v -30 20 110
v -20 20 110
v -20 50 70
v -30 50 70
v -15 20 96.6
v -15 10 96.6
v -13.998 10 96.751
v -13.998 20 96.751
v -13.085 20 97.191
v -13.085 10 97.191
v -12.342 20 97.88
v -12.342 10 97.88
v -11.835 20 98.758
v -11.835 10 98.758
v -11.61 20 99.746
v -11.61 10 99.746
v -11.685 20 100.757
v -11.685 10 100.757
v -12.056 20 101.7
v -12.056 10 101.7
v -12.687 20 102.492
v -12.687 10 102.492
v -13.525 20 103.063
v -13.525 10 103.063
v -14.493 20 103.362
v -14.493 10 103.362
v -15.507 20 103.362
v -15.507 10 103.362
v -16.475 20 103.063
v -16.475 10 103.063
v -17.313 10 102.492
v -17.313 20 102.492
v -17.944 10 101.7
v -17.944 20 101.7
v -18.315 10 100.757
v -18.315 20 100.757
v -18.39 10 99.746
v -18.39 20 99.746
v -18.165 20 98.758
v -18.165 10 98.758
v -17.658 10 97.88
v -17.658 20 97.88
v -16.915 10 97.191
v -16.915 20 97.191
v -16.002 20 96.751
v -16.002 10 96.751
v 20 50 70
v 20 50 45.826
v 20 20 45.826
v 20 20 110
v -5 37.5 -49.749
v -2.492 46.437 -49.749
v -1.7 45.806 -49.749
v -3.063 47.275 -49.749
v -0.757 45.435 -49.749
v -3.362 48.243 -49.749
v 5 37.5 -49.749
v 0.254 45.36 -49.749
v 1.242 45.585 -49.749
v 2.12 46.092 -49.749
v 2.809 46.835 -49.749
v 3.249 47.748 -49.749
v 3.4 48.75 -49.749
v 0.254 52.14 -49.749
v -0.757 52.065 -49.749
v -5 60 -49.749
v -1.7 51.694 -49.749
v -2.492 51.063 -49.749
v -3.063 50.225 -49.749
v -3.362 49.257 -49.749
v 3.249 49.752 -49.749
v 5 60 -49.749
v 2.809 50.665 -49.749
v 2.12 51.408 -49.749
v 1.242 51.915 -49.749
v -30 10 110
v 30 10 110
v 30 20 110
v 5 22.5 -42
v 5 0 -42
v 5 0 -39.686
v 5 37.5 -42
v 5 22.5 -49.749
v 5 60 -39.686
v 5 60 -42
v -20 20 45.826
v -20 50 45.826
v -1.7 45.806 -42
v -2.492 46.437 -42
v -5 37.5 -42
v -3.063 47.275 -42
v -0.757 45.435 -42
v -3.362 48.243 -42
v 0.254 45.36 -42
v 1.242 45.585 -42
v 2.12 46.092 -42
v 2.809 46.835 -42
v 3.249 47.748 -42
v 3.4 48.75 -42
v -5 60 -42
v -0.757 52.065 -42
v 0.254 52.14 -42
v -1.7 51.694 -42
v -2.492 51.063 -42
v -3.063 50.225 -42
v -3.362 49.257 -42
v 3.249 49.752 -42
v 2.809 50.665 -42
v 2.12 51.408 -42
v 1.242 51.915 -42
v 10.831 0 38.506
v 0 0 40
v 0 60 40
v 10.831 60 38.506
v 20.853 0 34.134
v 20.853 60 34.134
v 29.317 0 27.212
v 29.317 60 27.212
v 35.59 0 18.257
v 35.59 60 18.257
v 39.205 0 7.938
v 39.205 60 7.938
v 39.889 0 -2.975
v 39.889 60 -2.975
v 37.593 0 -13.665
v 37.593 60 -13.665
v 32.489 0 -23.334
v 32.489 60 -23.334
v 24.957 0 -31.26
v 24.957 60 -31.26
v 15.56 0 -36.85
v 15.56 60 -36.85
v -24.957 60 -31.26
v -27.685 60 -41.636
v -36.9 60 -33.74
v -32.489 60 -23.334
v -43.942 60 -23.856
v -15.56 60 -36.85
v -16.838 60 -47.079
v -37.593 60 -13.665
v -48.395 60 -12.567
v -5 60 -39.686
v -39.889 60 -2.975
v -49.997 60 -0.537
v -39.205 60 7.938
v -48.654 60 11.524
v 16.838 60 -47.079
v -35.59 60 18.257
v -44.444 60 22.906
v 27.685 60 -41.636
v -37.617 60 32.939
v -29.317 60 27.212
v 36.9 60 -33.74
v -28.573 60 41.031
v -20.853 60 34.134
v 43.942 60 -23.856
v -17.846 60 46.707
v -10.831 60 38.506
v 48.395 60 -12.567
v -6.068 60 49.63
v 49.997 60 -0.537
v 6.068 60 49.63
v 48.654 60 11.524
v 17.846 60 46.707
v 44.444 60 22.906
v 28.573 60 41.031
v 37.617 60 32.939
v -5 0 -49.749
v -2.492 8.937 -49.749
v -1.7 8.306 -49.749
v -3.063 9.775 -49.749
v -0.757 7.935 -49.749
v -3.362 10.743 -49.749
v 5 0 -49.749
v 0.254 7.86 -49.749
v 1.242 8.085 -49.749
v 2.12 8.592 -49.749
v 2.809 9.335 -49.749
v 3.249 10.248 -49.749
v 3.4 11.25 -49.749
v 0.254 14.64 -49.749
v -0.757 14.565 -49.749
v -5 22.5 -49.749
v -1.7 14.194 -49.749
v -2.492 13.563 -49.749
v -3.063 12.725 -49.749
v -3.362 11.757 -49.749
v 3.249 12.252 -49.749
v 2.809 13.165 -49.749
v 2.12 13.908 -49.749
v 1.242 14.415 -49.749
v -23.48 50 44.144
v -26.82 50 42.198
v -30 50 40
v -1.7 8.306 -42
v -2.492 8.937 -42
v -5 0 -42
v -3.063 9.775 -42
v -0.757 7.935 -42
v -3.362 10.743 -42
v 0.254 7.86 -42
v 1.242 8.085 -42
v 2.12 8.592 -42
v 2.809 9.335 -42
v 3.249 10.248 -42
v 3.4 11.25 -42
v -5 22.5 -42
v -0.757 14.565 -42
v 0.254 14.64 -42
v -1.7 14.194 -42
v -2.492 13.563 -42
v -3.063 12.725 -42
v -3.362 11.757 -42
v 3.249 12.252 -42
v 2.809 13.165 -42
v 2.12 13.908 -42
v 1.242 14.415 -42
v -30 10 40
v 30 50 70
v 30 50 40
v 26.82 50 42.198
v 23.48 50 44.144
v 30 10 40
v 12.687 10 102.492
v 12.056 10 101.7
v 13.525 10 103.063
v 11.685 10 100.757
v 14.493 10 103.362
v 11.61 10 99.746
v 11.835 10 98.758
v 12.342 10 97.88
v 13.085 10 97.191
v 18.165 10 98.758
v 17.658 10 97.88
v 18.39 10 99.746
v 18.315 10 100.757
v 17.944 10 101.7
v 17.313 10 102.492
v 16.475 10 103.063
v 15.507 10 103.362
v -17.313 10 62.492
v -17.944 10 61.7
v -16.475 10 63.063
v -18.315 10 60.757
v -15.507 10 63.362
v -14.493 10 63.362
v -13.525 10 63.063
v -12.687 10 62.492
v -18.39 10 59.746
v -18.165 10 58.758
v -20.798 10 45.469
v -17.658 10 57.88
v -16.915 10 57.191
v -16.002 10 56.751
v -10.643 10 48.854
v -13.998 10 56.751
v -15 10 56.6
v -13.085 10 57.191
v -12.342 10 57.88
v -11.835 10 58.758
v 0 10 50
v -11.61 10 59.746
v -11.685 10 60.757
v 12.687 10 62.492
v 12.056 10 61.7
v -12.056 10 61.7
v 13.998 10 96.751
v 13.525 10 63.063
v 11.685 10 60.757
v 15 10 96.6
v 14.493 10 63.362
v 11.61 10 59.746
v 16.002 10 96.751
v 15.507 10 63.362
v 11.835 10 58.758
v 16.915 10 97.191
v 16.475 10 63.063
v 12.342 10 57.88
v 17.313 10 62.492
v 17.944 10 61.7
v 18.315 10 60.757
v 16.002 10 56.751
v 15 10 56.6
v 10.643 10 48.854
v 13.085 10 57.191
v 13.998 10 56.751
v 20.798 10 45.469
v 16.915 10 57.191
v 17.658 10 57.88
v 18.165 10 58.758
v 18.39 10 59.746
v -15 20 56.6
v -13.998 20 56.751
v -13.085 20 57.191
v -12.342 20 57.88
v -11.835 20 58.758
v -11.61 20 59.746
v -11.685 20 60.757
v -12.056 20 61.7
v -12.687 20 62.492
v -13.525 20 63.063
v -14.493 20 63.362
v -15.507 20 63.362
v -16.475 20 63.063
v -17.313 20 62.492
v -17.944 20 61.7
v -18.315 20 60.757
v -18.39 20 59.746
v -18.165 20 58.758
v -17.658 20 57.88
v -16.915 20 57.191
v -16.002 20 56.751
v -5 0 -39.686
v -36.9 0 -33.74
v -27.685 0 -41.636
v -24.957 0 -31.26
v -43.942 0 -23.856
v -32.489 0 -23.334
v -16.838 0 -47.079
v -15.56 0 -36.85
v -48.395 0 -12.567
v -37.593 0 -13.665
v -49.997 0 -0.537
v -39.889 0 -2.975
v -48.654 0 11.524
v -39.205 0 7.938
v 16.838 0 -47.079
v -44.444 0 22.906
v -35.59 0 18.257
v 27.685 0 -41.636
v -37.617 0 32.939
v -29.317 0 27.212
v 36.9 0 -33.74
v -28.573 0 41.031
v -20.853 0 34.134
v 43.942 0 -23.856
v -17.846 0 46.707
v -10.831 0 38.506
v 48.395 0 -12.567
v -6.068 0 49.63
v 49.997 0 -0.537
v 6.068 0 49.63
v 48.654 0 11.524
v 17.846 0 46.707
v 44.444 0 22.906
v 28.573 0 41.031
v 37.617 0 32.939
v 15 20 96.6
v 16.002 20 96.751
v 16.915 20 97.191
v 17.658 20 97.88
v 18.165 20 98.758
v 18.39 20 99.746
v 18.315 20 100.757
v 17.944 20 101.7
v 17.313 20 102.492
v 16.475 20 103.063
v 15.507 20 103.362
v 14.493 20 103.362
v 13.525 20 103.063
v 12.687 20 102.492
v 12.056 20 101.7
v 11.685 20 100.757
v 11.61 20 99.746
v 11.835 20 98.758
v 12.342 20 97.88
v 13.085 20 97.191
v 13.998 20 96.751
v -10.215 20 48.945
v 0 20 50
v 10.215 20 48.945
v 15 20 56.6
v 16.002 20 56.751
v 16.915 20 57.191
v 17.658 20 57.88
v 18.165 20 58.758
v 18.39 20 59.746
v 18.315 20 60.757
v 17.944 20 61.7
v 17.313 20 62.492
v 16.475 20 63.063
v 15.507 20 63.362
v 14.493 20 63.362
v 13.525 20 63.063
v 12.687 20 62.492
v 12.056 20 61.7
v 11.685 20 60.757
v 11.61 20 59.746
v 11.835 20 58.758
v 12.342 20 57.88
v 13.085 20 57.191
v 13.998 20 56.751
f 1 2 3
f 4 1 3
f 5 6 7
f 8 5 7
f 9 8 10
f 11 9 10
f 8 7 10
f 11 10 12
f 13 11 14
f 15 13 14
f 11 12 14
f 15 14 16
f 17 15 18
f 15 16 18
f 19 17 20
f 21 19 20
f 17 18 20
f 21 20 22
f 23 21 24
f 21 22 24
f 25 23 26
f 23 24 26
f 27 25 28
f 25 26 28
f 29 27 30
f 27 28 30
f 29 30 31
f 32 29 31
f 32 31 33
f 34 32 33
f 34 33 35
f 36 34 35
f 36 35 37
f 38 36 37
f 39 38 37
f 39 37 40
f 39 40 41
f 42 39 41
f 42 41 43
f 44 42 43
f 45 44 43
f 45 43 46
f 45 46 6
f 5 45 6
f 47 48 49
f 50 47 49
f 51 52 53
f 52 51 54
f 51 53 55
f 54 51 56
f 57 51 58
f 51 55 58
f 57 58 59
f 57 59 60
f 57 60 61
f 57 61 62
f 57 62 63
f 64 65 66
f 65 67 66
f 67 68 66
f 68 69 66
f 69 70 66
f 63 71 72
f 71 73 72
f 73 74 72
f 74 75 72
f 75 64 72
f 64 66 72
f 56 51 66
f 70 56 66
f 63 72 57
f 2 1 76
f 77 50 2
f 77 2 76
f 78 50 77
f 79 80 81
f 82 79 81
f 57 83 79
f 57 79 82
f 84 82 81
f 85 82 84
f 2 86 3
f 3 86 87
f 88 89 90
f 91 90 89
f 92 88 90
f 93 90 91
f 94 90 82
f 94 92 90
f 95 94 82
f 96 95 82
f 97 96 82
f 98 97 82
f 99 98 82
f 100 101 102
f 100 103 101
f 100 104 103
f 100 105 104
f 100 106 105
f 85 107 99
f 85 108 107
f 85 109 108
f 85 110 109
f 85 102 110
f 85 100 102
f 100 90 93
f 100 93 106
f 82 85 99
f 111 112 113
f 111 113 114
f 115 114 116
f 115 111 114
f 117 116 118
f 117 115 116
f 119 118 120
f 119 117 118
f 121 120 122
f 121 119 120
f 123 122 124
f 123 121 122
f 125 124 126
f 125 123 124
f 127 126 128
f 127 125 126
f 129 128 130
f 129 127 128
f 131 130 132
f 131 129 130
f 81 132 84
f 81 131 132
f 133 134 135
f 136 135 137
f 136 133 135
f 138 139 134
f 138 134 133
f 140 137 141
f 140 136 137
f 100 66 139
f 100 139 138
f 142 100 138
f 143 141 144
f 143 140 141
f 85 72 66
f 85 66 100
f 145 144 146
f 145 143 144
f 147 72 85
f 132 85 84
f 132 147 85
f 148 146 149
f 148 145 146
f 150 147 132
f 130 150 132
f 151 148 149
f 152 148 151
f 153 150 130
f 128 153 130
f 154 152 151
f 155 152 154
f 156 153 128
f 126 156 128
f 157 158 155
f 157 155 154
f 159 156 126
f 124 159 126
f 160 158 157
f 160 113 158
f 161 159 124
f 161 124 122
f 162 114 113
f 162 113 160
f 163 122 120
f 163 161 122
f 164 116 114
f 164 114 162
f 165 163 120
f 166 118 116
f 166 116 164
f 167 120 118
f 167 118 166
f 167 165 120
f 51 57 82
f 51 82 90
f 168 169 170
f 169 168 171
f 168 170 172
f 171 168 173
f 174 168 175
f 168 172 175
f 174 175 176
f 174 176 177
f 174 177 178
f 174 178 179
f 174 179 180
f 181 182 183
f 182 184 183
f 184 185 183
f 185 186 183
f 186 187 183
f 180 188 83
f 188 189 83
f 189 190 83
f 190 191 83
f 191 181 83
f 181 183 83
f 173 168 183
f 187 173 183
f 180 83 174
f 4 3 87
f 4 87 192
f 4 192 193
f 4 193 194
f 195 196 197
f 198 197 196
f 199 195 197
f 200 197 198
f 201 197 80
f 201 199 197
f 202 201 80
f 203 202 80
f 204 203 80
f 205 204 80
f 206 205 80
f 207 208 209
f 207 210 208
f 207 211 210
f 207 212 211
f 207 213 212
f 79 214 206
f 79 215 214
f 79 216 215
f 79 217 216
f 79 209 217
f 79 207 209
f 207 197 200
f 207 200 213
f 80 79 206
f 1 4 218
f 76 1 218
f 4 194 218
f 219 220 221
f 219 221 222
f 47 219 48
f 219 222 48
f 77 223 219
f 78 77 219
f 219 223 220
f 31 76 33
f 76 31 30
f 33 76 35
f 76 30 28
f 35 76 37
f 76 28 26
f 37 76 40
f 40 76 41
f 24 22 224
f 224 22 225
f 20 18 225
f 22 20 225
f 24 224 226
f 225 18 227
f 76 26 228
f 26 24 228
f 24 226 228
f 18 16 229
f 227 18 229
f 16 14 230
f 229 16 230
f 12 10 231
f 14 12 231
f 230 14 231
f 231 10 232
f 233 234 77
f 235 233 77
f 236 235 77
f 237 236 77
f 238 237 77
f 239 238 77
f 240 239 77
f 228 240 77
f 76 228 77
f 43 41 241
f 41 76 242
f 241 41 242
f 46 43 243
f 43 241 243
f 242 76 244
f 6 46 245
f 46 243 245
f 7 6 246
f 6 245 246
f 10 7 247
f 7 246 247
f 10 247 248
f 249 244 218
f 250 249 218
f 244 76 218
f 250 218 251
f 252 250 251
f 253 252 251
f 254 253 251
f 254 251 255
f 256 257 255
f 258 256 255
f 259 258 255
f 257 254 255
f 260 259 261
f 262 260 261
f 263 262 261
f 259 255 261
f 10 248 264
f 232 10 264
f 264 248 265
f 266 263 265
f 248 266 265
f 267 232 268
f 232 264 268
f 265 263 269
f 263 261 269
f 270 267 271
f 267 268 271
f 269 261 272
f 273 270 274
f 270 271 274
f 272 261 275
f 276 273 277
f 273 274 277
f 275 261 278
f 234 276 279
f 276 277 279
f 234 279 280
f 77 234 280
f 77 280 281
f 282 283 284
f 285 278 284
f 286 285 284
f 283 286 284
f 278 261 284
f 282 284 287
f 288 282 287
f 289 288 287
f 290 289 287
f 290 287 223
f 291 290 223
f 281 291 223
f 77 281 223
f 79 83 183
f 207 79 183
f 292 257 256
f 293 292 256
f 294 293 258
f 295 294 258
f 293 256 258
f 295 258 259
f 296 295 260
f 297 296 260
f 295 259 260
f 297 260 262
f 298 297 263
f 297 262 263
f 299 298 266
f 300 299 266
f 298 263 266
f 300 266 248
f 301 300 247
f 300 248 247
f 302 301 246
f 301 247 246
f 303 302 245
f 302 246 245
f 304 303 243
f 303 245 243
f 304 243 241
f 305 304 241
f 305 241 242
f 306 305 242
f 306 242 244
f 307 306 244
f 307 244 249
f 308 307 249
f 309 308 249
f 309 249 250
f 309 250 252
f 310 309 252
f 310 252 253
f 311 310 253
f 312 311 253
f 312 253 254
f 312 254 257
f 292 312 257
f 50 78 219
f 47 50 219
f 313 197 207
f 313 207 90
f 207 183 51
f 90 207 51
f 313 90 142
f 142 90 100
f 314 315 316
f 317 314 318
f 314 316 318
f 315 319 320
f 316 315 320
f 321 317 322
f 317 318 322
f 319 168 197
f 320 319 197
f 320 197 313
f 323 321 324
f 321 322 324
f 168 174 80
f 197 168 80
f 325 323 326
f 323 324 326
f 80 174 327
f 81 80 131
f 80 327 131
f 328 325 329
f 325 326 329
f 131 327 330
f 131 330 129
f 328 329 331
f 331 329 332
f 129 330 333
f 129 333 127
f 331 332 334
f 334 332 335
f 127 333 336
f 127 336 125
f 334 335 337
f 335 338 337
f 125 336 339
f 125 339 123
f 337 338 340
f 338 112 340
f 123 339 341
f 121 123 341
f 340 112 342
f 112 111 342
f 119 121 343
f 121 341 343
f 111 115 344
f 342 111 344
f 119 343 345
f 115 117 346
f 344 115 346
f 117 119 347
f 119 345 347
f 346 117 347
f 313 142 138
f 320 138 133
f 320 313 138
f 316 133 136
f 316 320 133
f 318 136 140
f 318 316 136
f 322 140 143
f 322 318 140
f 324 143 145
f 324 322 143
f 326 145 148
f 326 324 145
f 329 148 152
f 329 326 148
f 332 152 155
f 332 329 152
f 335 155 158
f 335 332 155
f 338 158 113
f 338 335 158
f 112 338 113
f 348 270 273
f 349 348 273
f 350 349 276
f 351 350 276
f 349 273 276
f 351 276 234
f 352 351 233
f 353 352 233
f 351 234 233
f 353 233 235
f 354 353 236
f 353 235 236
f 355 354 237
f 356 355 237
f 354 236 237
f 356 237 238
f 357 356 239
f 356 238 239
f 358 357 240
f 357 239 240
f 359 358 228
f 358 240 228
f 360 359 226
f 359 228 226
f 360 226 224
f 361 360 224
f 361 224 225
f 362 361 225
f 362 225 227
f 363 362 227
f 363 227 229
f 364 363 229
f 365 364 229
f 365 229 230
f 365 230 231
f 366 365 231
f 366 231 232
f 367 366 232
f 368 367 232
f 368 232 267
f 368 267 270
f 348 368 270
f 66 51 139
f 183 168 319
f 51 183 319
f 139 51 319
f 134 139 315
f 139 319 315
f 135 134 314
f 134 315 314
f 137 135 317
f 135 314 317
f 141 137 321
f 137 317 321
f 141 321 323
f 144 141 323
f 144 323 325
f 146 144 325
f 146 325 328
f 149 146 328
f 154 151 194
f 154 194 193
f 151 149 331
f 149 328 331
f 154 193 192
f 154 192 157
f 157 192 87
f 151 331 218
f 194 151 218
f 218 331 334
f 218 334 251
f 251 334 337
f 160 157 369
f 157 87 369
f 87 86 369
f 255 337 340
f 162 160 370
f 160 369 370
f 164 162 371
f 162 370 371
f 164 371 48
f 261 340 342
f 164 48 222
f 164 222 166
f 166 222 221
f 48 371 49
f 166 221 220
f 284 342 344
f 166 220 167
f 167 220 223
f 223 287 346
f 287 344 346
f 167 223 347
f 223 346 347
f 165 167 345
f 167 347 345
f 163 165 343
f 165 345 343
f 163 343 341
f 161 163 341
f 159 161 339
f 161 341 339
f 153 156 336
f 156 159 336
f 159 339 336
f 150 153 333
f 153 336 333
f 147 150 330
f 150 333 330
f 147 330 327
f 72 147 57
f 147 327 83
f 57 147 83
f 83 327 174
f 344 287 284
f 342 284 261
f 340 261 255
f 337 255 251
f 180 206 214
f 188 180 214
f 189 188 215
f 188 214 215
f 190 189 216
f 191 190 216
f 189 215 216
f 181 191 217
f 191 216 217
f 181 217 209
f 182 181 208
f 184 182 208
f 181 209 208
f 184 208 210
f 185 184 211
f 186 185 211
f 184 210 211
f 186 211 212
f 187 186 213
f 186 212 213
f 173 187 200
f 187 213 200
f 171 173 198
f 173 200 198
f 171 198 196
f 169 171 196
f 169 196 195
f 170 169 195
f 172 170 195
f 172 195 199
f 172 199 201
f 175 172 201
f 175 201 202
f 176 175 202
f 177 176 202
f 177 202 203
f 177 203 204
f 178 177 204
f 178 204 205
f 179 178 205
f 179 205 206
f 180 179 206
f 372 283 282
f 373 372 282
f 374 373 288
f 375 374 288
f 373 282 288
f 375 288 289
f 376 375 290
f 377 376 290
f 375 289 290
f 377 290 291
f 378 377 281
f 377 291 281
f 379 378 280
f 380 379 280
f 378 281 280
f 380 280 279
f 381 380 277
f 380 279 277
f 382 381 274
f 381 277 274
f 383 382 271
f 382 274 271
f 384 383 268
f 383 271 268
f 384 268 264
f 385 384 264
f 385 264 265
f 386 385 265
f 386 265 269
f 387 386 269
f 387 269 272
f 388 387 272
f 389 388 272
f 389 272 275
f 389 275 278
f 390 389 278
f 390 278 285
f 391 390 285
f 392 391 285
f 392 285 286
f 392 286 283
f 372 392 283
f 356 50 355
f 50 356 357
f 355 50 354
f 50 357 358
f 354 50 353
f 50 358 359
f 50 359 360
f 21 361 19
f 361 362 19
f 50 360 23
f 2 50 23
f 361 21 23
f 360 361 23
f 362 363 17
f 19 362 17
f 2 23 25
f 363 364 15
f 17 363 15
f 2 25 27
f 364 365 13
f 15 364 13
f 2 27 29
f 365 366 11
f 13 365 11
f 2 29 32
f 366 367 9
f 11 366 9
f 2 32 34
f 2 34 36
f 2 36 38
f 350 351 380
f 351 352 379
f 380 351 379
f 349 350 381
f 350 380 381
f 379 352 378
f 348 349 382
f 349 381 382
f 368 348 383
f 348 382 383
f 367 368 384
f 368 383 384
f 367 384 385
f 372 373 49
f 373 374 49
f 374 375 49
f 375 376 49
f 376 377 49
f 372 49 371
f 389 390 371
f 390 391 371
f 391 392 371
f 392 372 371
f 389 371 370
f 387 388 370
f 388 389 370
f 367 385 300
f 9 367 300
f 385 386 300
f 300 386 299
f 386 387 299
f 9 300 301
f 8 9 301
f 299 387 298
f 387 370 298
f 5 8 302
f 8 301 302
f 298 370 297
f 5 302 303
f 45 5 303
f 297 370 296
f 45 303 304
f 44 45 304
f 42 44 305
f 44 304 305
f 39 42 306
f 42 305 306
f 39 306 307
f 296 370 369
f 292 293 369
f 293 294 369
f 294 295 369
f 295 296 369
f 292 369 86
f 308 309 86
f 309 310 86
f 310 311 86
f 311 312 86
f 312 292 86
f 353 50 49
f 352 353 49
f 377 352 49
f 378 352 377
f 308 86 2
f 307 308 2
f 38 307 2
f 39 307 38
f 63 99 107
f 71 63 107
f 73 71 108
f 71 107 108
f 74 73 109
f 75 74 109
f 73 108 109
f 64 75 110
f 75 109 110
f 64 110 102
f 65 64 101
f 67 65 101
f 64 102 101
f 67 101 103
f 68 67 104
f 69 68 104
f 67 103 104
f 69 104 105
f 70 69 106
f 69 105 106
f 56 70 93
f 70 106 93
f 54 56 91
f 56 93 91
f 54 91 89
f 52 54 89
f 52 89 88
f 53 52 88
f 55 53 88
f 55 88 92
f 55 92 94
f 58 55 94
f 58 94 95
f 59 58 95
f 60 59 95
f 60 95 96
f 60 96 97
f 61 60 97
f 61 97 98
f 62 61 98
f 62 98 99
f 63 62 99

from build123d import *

# Parameters (mm, degrees)
SKETCH1_R             = 50
SKETCH1_R_2           = 40
EXTRUDE1_DEPTH        = 60
EXTRUDE2_REACH        = 128.886
EXTRUDE2_END_RADIUS   = 50
EXTRUDE5_DEPTH        = 60
EXTRUDE6_DEPTH        = 149.660687473
EXTRUDE6_DEPTH_BACK   = 149.660687473
SKETCH10_W            = 10
SKETCH10_H            = 4
SKETCH10_H_2          = 0.50125629
EXTRUDE7_DEPTH        = 135.907375632
EXTRUDE8_REACH        = 179.82
SKETCH11_W            = 10
SKETCH11_H            = 15
M8_TAPPED_HOLE2_D     = 6.8
M8_TAPPED_HOLE2_DEPTH = 19.75
M8_TAPPED_HOLE2_TIP   = 2.042926105
M8_TAPPED_HOLE3_D     = 6.8
M8_TAPPED_HOLE3_DEPTH = 19.75
M8_TAPPED_HOLE3_TIP   = 2.042926105


with BuildPart() as part:
    # Sketch1 → Extrude1 (new body)
    with BuildSketch(Plane(origin=(0, 0, 0), x_dir=(1, 0, 0), z_dir=(0, 1, 0))):
        with Locations(Location((0, 0, 0), (0, 0, 270))):
            Circle(SKETCH1_R)
        with Locations(Location((0, 0, 0), (0, 0, 270))):
            Circle(SKETCH1_R_2, mode=Mode.SUBTRACT)
    extrude(amount=EXTRUDE1_DEPTH)

    # Extrude2: up to this cylinder (the profile starts outside it)
    extrude2_end = Plane(origin=(0, 49.27889, 0), z_dir=(0, -1, 0)) * Cylinder(EXTRUDE2_END_RADIUS, 358.772, mode=Mode.PRIVATE)
    # Sketch2 → Extrude2 (add, up to the surface)
    with BuildSketch(Plane.XY.offset(50), mode=Mode.PRIVATE) as extrude2_sk1:
        Polygon((-30, 50), (-20, 50), (-20, 20), (20, 20), (20, 50), (30, 50), (30, 10), (-30, 10), align=None)
    extrude2_tool1 = extrude(extrude2_sk1.sketch, amount=-EXTRUDE2_REACH, mode=Mode.PRIVATE) - extrude2_end
    add(extrude2_tool1.solids().sort_by_distance((-25, 49.27889, 50))[0])
    add(extrude2_tool1.solids().sort_by_distance((-25, 49.27889, 50))[1])

    # Sketch8 → Extrude5 (add)
    with BuildSketch(Plane.XY.offset(50)):
        Polygon((20, 20), (0, 20), (-20, 20), (-20, 50), (-30, 50), (-30, 10), (0, 10), (30, 10), (30, 50), (20, 50), align=None)
    extrude(amount=EXTRUDE5_DEPTH)

    # Sketch9 → Extrude6 (cut, two sides: drawn at the far end of the back side and taken through both)
    with BuildSketch(Plane.ZY.offset(30).offset(-EXTRUDE6_DEPTH_BACK)):
        Polygon((110, 50), (110, 20), (70, 50), align=None)
    extrude(amount=EXTRUDE6_DEPTH + EXTRUDE6_DEPTH_BACK, mode=Mode.SUBTRACT)

    # Sketch10 → Extrude7 (cut, through all)
    with BuildSketch(Plane(origin=(0, 60, 0), x_dir=(1, 0, 0), z_dir=(0, 1, 0))):
        with Locations((0, 40)):
            Rectangle(SKETCH10_W, SKETCH10_H)
        with Locations((0, 50)):
            Rectangle(SKETCH10_W, SKETCH10_H_2)
    extrude(amount=-EXTRUDE7_DEPTH, mode=Mode.SUBTRACT)

    # Sketch11 → Extrude8 (cut, up to next)
    with BuildSketch(Plane(origin=(0, 0, -49.749371855), x_dir=(-1, 0, 0), z_dir=(0, 0, -1)), mode=Mode.PRIVATE) as extrude8_sk1:
        with Locations((0, 30)):
            Rectangle(SKETCH11_W, SKETCH11_H)
    extrude8_tool1 = extrude(extrude8_sk1.sketch, amount=-EXTRUDE8_REACH, mode=Mode.PRIVATE) & part.part
    add(extrude8_tool1.solids().sort_by_distance((0, 30, -49.749372))[0], mode=Mode.SUBTRACT)

    # M8 Tapped Hole2
    with Locations(Plane(origin=(0, 48.75, -49.749371855), x_dir=(-1, 0, 0), z_dir=(0, 0, -1))):
        with Locations((0, 0), (0, -37.5)):
            Hole(M8_TAPPED_HOLE2_D / 2, depth=M8_TAPPED_HOLE2_DEPTH)
            with Locations((0, 0, -(M8_TAPPED_HOLE2_DEPTH + M8_TAPPED_HOLE2_TIP / 2))):  # 118° drill point
                Cone(0, M8_TAPPED_HOLE2_D / 2, M8_TAPPED_HOLE2_TIP, mode=Mode.SUBTRACT)

    # M8 Tapped Hole3
    with Locations(Plane(origin=(-15, 20, 60), x_dir=(0, 0, 1), z_dir=(0, 1, 0))):
        with Locations((0, 0), (0, 30), (40, 0), (40, 30)):
            Hole(M8_TAPPED_HOLE3_D / 2, depth=M8_TAPPED_HOLE3_DEPTH)
            with Locations((0, 0, -(M8_TAPPED_HOLE3_DEPTH + M8_TAPPED_HOLE3_TIP / 2))):  # 118° drill point
                Cone(0, M8_TAPPED_HOLE3_D / 2, M8_TAPPED_HOLE3_TIP, mode=Mode.SUBTRACT)


solid = part.part
